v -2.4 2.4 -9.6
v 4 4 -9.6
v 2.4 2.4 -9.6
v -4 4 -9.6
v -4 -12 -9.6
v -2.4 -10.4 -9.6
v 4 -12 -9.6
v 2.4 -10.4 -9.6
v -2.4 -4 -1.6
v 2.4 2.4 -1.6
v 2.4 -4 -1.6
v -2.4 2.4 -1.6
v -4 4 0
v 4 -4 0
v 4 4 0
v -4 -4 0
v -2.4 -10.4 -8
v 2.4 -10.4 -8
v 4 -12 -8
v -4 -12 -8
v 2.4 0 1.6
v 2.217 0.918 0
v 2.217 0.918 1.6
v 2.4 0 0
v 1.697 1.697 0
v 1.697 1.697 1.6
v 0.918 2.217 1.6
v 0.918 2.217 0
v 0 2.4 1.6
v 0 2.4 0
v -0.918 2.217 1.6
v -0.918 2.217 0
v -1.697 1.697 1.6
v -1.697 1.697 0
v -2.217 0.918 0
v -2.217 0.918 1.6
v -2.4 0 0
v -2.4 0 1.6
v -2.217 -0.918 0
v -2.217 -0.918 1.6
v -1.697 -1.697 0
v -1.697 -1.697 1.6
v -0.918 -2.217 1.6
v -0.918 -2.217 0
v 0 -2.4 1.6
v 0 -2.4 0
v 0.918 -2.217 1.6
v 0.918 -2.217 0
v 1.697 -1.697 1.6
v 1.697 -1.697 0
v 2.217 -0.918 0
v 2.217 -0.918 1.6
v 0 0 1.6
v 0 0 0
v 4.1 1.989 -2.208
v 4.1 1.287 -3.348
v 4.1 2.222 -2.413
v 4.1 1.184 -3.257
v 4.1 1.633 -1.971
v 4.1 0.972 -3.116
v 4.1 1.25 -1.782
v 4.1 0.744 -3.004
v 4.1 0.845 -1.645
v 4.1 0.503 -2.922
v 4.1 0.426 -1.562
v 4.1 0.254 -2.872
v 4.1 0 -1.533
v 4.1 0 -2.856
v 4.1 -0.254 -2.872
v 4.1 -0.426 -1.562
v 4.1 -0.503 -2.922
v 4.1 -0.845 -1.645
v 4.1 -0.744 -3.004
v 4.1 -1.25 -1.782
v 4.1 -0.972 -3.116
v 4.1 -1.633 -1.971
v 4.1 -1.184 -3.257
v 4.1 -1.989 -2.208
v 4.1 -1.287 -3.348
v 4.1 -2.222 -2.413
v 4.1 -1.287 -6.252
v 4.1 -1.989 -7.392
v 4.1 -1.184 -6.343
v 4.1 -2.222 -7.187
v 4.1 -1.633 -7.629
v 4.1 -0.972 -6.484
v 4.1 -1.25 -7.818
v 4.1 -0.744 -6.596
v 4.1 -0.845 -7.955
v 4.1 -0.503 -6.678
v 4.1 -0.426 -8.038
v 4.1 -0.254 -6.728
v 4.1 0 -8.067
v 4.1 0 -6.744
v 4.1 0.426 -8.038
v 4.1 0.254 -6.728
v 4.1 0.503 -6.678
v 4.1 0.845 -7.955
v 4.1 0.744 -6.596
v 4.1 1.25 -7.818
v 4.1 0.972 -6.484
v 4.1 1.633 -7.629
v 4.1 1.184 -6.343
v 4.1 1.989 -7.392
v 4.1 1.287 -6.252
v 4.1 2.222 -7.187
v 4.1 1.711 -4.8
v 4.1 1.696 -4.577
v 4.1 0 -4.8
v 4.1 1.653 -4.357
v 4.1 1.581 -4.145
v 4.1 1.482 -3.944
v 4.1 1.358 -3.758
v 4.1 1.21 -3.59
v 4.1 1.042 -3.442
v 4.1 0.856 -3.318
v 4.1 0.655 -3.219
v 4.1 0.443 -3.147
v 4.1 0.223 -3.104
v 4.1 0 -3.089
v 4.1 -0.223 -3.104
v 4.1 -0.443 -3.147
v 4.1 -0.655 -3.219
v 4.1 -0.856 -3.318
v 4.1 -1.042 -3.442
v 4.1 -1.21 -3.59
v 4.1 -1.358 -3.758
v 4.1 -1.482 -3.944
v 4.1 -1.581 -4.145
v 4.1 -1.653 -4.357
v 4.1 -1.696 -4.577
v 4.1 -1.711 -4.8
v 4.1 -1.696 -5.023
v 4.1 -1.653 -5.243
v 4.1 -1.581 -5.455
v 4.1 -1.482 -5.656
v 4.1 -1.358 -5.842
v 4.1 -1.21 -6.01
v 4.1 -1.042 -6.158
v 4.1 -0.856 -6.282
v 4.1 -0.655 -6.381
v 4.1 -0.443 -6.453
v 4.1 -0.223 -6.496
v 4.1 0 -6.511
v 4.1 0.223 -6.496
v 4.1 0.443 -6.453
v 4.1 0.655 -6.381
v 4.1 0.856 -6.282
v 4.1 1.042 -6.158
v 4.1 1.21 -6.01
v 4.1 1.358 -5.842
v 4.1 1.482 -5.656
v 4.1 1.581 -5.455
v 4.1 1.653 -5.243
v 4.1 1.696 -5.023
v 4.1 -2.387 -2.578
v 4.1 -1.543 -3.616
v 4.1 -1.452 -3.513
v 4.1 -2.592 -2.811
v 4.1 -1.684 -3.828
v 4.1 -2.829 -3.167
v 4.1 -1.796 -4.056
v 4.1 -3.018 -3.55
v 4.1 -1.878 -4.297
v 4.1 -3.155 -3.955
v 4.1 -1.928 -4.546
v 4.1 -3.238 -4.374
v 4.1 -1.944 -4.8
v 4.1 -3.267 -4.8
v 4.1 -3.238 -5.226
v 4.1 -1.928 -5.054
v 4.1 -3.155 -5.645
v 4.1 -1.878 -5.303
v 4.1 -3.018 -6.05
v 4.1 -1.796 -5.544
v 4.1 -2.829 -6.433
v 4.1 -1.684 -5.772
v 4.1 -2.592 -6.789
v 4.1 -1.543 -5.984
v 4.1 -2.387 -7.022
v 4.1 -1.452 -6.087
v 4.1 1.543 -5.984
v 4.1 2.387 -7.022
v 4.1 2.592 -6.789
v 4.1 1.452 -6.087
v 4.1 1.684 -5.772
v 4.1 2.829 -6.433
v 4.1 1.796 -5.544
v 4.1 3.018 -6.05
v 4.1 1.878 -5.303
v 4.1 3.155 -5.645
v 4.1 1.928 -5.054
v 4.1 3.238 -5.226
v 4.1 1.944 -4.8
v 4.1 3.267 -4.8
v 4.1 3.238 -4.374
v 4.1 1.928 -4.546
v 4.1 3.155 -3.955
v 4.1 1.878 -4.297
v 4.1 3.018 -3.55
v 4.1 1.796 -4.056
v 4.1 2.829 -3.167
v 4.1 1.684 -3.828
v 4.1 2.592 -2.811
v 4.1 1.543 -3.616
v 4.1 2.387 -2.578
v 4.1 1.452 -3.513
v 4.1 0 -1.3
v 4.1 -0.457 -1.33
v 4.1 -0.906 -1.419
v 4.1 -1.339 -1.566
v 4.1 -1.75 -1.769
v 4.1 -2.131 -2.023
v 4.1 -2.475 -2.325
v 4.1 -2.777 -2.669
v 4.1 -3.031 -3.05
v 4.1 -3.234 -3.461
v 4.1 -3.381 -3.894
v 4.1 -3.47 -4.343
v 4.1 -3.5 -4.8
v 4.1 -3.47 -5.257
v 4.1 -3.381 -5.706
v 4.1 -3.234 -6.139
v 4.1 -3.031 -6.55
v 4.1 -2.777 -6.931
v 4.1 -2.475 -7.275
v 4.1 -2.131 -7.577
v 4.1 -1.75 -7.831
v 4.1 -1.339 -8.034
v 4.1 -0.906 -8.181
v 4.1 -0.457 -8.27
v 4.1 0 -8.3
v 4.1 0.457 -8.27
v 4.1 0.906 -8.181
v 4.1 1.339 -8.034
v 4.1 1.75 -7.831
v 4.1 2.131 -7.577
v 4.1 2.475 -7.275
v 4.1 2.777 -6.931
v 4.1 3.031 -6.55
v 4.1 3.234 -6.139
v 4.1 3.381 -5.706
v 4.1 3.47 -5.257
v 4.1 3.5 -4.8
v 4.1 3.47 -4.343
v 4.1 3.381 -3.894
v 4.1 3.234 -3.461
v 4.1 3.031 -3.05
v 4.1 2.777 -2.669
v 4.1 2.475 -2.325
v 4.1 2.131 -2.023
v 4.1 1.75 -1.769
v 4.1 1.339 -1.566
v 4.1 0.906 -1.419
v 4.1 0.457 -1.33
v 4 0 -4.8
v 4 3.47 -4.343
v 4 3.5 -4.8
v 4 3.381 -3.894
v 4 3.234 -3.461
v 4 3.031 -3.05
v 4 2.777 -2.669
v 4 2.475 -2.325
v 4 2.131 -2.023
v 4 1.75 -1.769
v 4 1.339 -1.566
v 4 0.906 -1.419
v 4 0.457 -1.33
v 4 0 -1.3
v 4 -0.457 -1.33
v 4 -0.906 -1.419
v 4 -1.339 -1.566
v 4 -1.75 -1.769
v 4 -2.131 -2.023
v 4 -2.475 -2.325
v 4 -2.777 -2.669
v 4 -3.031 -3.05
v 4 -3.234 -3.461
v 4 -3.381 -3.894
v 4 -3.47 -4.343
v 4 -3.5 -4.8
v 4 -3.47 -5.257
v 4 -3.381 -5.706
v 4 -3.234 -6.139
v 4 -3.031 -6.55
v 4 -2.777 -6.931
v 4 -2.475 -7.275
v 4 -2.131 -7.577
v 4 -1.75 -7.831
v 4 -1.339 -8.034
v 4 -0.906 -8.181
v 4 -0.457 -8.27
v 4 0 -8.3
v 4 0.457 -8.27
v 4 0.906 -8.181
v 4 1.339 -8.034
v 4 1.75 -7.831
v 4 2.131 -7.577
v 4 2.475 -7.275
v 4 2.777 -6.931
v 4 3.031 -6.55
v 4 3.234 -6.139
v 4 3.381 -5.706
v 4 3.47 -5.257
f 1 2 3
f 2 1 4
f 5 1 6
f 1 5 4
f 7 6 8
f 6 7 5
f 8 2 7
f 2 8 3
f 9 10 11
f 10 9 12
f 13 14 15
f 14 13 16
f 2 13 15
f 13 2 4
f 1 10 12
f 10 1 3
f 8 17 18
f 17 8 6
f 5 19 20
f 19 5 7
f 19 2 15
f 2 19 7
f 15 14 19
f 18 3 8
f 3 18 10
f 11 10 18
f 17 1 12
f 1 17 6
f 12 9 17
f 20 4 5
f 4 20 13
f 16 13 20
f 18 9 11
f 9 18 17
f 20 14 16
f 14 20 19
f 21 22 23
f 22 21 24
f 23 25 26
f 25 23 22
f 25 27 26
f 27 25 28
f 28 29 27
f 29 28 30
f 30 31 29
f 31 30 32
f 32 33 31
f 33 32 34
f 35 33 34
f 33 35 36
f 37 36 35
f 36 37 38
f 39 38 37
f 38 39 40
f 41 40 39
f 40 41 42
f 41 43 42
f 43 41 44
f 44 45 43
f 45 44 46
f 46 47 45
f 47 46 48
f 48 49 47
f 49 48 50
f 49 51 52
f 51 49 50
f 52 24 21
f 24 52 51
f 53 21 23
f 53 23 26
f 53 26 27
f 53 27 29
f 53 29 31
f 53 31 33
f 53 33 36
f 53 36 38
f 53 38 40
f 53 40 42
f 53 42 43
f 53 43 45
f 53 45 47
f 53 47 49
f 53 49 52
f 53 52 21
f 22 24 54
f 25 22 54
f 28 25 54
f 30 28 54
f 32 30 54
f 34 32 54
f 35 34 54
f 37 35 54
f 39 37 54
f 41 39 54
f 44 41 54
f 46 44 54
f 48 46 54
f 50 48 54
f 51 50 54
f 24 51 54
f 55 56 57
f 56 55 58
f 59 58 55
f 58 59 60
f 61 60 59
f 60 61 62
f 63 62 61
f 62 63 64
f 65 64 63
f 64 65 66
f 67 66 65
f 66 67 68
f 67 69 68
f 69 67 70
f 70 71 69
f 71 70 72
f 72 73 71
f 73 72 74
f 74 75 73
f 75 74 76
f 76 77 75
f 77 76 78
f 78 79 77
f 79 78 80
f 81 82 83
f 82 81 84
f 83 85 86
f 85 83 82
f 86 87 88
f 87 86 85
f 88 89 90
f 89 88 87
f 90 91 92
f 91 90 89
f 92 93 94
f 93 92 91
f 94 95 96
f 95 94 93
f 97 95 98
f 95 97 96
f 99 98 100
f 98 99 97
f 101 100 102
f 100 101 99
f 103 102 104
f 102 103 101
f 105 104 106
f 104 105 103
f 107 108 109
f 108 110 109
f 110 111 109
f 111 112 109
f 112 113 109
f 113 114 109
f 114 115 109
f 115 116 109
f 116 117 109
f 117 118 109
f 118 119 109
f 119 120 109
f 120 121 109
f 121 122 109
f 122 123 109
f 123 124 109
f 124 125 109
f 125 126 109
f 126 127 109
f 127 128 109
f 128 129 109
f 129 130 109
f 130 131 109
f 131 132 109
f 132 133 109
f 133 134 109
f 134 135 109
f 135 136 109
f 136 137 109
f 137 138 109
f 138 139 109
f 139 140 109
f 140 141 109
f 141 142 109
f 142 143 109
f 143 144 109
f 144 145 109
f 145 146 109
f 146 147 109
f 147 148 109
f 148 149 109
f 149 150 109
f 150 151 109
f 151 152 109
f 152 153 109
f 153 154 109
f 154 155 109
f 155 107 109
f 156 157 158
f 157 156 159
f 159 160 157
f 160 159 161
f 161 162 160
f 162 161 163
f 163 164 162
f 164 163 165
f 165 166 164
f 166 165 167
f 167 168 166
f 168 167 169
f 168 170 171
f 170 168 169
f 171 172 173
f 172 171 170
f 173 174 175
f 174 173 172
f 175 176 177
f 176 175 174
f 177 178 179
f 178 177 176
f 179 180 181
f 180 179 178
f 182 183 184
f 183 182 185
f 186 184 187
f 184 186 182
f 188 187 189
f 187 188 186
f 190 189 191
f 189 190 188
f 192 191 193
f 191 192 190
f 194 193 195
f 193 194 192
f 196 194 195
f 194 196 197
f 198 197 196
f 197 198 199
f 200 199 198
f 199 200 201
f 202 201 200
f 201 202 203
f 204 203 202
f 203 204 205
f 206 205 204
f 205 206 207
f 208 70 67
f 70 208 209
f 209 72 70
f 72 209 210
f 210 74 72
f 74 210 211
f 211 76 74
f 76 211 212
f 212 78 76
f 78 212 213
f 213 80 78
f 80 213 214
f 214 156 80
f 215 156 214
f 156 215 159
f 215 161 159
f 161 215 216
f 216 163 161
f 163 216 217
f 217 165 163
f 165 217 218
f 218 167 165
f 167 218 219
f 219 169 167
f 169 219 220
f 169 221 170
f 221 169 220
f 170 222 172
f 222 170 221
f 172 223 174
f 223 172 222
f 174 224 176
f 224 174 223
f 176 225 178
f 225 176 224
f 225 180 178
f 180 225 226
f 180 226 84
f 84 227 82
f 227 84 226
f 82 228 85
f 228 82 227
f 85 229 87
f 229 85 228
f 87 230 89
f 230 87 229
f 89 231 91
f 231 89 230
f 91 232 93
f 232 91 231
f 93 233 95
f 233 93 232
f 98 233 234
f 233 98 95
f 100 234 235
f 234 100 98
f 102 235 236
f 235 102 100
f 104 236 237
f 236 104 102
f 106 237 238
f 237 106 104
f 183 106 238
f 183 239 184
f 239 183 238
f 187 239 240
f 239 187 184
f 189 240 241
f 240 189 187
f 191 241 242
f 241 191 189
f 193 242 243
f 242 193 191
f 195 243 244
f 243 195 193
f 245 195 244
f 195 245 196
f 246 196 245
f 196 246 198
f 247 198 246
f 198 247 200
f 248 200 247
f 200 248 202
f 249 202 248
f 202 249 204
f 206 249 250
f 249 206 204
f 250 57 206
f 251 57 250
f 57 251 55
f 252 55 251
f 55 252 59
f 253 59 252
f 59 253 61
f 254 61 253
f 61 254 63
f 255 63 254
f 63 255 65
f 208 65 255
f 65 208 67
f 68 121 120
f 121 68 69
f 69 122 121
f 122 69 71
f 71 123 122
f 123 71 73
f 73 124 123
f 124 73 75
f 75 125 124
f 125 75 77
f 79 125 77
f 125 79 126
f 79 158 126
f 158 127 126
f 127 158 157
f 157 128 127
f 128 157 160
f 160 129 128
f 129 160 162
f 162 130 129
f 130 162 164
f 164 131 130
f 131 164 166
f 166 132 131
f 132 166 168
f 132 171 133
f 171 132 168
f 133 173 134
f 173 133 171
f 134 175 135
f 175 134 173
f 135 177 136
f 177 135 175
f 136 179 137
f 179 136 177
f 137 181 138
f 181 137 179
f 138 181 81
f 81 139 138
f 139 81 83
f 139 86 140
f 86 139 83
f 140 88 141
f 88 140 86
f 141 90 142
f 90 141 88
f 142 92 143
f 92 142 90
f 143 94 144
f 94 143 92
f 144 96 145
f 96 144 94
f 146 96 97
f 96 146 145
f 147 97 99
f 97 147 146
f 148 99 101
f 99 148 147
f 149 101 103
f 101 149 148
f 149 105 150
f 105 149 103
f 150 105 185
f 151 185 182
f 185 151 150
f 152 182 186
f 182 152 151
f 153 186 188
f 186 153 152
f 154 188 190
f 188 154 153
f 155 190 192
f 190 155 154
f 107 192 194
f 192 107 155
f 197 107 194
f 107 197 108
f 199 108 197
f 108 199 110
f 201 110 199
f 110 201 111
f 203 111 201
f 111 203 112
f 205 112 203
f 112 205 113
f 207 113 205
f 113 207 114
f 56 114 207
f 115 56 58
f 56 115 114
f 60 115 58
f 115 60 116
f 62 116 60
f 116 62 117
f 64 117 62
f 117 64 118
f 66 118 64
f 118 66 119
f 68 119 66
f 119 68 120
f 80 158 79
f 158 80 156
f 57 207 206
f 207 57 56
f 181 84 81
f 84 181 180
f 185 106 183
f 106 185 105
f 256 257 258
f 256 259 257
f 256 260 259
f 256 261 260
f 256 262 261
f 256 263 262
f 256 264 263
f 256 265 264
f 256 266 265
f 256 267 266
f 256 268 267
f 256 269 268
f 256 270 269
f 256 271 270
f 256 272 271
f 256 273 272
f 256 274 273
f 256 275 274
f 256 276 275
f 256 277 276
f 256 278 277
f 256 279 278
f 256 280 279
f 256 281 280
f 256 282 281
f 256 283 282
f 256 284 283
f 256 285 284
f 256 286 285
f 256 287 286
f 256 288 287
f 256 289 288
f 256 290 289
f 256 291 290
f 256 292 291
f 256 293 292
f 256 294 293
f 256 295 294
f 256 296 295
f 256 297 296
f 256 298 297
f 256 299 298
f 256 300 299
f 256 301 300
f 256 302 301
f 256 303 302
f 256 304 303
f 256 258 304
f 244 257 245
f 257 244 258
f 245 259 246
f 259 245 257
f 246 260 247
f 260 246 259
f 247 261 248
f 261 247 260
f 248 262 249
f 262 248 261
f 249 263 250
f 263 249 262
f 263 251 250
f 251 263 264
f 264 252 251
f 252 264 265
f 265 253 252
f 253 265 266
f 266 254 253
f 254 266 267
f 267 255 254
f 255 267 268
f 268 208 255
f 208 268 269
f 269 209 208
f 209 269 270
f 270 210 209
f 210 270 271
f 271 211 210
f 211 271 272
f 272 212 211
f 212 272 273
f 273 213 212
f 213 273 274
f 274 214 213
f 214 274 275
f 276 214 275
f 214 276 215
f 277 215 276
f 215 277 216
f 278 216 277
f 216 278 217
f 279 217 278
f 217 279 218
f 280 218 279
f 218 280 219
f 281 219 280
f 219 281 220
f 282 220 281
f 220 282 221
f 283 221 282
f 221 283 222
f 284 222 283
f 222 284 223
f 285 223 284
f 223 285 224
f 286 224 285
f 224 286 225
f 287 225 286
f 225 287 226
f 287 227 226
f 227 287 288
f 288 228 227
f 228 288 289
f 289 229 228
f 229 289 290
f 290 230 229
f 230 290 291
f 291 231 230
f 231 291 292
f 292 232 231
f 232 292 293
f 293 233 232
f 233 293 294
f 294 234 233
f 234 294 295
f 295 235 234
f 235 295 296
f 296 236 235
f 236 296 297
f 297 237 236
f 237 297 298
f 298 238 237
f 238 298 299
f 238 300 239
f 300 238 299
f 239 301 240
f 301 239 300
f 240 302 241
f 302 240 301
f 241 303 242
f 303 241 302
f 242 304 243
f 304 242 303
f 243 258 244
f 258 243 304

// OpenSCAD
use <../lib.scad>
use <003605e.scad>
use <3040a.scad>
function ldraw_lib__3040ad02() = [
// 0 Slope Brick 45  2 x  1 with Life Preserver Right Sticker
// 0 Name: 3040ad02.dat
// 0 Author: Takeshi Takahashi [RainbowDolphin]
// 0 !LDRAW_ORG Shortcut UPDATE 2024-11
// 0 !LICENSE Licensed under CC BY 4.0 : see CAreadme.txt
// 
// 0 BFC CERTIFY CCW
  [0,"BFC","CERTIFY"],
  [0,"BFC","CCW"],
// 
// 0 !CATEGORY Sticker Shortcut
// 0 !KEYWORDS Bricklink 3040apb01R, Fuel tanker, set 373-1
// 
// 0 !HISTORY 2024-09-30 [OrionP] Official Update 2024-08
// 0 !HISTORY 2024-12-23 [MagFors] Update description
// 0 !HISTORY 2024-12-30 [OrionP] Official Update 2024-11
// 
// 1 16 0 0 0 1 0 0 0 1 0 0 0 1 3040a.dat
  [1,16,0,0,0,1,0,0,0,1,0,0,0,1, ldraw_lib__3040a()],
// 1 16 10 12 0 0 -1 0 0 0 -1 1 0 0 003605e.dat
  [1,16,10,12,0,0,-1,0,0,0,-1,1,0,0, ldraw_lib__003605e()],
// 0 // 1 16 -10 12 0 0 1 0 0 0 -1 -1 0 0 003605e.dat
];
module ldraw_lib__3040ad02(step=0, col=false, unit=2/5, alt=false, line=0.2, solid=!$preview)
    makepoly(ldraw_lib__3040ad02(), step=step, col=col, unit=unit, alt=alt, line=line, solid=solid);
ldraw_lib__3040ad02(line=0.2);
